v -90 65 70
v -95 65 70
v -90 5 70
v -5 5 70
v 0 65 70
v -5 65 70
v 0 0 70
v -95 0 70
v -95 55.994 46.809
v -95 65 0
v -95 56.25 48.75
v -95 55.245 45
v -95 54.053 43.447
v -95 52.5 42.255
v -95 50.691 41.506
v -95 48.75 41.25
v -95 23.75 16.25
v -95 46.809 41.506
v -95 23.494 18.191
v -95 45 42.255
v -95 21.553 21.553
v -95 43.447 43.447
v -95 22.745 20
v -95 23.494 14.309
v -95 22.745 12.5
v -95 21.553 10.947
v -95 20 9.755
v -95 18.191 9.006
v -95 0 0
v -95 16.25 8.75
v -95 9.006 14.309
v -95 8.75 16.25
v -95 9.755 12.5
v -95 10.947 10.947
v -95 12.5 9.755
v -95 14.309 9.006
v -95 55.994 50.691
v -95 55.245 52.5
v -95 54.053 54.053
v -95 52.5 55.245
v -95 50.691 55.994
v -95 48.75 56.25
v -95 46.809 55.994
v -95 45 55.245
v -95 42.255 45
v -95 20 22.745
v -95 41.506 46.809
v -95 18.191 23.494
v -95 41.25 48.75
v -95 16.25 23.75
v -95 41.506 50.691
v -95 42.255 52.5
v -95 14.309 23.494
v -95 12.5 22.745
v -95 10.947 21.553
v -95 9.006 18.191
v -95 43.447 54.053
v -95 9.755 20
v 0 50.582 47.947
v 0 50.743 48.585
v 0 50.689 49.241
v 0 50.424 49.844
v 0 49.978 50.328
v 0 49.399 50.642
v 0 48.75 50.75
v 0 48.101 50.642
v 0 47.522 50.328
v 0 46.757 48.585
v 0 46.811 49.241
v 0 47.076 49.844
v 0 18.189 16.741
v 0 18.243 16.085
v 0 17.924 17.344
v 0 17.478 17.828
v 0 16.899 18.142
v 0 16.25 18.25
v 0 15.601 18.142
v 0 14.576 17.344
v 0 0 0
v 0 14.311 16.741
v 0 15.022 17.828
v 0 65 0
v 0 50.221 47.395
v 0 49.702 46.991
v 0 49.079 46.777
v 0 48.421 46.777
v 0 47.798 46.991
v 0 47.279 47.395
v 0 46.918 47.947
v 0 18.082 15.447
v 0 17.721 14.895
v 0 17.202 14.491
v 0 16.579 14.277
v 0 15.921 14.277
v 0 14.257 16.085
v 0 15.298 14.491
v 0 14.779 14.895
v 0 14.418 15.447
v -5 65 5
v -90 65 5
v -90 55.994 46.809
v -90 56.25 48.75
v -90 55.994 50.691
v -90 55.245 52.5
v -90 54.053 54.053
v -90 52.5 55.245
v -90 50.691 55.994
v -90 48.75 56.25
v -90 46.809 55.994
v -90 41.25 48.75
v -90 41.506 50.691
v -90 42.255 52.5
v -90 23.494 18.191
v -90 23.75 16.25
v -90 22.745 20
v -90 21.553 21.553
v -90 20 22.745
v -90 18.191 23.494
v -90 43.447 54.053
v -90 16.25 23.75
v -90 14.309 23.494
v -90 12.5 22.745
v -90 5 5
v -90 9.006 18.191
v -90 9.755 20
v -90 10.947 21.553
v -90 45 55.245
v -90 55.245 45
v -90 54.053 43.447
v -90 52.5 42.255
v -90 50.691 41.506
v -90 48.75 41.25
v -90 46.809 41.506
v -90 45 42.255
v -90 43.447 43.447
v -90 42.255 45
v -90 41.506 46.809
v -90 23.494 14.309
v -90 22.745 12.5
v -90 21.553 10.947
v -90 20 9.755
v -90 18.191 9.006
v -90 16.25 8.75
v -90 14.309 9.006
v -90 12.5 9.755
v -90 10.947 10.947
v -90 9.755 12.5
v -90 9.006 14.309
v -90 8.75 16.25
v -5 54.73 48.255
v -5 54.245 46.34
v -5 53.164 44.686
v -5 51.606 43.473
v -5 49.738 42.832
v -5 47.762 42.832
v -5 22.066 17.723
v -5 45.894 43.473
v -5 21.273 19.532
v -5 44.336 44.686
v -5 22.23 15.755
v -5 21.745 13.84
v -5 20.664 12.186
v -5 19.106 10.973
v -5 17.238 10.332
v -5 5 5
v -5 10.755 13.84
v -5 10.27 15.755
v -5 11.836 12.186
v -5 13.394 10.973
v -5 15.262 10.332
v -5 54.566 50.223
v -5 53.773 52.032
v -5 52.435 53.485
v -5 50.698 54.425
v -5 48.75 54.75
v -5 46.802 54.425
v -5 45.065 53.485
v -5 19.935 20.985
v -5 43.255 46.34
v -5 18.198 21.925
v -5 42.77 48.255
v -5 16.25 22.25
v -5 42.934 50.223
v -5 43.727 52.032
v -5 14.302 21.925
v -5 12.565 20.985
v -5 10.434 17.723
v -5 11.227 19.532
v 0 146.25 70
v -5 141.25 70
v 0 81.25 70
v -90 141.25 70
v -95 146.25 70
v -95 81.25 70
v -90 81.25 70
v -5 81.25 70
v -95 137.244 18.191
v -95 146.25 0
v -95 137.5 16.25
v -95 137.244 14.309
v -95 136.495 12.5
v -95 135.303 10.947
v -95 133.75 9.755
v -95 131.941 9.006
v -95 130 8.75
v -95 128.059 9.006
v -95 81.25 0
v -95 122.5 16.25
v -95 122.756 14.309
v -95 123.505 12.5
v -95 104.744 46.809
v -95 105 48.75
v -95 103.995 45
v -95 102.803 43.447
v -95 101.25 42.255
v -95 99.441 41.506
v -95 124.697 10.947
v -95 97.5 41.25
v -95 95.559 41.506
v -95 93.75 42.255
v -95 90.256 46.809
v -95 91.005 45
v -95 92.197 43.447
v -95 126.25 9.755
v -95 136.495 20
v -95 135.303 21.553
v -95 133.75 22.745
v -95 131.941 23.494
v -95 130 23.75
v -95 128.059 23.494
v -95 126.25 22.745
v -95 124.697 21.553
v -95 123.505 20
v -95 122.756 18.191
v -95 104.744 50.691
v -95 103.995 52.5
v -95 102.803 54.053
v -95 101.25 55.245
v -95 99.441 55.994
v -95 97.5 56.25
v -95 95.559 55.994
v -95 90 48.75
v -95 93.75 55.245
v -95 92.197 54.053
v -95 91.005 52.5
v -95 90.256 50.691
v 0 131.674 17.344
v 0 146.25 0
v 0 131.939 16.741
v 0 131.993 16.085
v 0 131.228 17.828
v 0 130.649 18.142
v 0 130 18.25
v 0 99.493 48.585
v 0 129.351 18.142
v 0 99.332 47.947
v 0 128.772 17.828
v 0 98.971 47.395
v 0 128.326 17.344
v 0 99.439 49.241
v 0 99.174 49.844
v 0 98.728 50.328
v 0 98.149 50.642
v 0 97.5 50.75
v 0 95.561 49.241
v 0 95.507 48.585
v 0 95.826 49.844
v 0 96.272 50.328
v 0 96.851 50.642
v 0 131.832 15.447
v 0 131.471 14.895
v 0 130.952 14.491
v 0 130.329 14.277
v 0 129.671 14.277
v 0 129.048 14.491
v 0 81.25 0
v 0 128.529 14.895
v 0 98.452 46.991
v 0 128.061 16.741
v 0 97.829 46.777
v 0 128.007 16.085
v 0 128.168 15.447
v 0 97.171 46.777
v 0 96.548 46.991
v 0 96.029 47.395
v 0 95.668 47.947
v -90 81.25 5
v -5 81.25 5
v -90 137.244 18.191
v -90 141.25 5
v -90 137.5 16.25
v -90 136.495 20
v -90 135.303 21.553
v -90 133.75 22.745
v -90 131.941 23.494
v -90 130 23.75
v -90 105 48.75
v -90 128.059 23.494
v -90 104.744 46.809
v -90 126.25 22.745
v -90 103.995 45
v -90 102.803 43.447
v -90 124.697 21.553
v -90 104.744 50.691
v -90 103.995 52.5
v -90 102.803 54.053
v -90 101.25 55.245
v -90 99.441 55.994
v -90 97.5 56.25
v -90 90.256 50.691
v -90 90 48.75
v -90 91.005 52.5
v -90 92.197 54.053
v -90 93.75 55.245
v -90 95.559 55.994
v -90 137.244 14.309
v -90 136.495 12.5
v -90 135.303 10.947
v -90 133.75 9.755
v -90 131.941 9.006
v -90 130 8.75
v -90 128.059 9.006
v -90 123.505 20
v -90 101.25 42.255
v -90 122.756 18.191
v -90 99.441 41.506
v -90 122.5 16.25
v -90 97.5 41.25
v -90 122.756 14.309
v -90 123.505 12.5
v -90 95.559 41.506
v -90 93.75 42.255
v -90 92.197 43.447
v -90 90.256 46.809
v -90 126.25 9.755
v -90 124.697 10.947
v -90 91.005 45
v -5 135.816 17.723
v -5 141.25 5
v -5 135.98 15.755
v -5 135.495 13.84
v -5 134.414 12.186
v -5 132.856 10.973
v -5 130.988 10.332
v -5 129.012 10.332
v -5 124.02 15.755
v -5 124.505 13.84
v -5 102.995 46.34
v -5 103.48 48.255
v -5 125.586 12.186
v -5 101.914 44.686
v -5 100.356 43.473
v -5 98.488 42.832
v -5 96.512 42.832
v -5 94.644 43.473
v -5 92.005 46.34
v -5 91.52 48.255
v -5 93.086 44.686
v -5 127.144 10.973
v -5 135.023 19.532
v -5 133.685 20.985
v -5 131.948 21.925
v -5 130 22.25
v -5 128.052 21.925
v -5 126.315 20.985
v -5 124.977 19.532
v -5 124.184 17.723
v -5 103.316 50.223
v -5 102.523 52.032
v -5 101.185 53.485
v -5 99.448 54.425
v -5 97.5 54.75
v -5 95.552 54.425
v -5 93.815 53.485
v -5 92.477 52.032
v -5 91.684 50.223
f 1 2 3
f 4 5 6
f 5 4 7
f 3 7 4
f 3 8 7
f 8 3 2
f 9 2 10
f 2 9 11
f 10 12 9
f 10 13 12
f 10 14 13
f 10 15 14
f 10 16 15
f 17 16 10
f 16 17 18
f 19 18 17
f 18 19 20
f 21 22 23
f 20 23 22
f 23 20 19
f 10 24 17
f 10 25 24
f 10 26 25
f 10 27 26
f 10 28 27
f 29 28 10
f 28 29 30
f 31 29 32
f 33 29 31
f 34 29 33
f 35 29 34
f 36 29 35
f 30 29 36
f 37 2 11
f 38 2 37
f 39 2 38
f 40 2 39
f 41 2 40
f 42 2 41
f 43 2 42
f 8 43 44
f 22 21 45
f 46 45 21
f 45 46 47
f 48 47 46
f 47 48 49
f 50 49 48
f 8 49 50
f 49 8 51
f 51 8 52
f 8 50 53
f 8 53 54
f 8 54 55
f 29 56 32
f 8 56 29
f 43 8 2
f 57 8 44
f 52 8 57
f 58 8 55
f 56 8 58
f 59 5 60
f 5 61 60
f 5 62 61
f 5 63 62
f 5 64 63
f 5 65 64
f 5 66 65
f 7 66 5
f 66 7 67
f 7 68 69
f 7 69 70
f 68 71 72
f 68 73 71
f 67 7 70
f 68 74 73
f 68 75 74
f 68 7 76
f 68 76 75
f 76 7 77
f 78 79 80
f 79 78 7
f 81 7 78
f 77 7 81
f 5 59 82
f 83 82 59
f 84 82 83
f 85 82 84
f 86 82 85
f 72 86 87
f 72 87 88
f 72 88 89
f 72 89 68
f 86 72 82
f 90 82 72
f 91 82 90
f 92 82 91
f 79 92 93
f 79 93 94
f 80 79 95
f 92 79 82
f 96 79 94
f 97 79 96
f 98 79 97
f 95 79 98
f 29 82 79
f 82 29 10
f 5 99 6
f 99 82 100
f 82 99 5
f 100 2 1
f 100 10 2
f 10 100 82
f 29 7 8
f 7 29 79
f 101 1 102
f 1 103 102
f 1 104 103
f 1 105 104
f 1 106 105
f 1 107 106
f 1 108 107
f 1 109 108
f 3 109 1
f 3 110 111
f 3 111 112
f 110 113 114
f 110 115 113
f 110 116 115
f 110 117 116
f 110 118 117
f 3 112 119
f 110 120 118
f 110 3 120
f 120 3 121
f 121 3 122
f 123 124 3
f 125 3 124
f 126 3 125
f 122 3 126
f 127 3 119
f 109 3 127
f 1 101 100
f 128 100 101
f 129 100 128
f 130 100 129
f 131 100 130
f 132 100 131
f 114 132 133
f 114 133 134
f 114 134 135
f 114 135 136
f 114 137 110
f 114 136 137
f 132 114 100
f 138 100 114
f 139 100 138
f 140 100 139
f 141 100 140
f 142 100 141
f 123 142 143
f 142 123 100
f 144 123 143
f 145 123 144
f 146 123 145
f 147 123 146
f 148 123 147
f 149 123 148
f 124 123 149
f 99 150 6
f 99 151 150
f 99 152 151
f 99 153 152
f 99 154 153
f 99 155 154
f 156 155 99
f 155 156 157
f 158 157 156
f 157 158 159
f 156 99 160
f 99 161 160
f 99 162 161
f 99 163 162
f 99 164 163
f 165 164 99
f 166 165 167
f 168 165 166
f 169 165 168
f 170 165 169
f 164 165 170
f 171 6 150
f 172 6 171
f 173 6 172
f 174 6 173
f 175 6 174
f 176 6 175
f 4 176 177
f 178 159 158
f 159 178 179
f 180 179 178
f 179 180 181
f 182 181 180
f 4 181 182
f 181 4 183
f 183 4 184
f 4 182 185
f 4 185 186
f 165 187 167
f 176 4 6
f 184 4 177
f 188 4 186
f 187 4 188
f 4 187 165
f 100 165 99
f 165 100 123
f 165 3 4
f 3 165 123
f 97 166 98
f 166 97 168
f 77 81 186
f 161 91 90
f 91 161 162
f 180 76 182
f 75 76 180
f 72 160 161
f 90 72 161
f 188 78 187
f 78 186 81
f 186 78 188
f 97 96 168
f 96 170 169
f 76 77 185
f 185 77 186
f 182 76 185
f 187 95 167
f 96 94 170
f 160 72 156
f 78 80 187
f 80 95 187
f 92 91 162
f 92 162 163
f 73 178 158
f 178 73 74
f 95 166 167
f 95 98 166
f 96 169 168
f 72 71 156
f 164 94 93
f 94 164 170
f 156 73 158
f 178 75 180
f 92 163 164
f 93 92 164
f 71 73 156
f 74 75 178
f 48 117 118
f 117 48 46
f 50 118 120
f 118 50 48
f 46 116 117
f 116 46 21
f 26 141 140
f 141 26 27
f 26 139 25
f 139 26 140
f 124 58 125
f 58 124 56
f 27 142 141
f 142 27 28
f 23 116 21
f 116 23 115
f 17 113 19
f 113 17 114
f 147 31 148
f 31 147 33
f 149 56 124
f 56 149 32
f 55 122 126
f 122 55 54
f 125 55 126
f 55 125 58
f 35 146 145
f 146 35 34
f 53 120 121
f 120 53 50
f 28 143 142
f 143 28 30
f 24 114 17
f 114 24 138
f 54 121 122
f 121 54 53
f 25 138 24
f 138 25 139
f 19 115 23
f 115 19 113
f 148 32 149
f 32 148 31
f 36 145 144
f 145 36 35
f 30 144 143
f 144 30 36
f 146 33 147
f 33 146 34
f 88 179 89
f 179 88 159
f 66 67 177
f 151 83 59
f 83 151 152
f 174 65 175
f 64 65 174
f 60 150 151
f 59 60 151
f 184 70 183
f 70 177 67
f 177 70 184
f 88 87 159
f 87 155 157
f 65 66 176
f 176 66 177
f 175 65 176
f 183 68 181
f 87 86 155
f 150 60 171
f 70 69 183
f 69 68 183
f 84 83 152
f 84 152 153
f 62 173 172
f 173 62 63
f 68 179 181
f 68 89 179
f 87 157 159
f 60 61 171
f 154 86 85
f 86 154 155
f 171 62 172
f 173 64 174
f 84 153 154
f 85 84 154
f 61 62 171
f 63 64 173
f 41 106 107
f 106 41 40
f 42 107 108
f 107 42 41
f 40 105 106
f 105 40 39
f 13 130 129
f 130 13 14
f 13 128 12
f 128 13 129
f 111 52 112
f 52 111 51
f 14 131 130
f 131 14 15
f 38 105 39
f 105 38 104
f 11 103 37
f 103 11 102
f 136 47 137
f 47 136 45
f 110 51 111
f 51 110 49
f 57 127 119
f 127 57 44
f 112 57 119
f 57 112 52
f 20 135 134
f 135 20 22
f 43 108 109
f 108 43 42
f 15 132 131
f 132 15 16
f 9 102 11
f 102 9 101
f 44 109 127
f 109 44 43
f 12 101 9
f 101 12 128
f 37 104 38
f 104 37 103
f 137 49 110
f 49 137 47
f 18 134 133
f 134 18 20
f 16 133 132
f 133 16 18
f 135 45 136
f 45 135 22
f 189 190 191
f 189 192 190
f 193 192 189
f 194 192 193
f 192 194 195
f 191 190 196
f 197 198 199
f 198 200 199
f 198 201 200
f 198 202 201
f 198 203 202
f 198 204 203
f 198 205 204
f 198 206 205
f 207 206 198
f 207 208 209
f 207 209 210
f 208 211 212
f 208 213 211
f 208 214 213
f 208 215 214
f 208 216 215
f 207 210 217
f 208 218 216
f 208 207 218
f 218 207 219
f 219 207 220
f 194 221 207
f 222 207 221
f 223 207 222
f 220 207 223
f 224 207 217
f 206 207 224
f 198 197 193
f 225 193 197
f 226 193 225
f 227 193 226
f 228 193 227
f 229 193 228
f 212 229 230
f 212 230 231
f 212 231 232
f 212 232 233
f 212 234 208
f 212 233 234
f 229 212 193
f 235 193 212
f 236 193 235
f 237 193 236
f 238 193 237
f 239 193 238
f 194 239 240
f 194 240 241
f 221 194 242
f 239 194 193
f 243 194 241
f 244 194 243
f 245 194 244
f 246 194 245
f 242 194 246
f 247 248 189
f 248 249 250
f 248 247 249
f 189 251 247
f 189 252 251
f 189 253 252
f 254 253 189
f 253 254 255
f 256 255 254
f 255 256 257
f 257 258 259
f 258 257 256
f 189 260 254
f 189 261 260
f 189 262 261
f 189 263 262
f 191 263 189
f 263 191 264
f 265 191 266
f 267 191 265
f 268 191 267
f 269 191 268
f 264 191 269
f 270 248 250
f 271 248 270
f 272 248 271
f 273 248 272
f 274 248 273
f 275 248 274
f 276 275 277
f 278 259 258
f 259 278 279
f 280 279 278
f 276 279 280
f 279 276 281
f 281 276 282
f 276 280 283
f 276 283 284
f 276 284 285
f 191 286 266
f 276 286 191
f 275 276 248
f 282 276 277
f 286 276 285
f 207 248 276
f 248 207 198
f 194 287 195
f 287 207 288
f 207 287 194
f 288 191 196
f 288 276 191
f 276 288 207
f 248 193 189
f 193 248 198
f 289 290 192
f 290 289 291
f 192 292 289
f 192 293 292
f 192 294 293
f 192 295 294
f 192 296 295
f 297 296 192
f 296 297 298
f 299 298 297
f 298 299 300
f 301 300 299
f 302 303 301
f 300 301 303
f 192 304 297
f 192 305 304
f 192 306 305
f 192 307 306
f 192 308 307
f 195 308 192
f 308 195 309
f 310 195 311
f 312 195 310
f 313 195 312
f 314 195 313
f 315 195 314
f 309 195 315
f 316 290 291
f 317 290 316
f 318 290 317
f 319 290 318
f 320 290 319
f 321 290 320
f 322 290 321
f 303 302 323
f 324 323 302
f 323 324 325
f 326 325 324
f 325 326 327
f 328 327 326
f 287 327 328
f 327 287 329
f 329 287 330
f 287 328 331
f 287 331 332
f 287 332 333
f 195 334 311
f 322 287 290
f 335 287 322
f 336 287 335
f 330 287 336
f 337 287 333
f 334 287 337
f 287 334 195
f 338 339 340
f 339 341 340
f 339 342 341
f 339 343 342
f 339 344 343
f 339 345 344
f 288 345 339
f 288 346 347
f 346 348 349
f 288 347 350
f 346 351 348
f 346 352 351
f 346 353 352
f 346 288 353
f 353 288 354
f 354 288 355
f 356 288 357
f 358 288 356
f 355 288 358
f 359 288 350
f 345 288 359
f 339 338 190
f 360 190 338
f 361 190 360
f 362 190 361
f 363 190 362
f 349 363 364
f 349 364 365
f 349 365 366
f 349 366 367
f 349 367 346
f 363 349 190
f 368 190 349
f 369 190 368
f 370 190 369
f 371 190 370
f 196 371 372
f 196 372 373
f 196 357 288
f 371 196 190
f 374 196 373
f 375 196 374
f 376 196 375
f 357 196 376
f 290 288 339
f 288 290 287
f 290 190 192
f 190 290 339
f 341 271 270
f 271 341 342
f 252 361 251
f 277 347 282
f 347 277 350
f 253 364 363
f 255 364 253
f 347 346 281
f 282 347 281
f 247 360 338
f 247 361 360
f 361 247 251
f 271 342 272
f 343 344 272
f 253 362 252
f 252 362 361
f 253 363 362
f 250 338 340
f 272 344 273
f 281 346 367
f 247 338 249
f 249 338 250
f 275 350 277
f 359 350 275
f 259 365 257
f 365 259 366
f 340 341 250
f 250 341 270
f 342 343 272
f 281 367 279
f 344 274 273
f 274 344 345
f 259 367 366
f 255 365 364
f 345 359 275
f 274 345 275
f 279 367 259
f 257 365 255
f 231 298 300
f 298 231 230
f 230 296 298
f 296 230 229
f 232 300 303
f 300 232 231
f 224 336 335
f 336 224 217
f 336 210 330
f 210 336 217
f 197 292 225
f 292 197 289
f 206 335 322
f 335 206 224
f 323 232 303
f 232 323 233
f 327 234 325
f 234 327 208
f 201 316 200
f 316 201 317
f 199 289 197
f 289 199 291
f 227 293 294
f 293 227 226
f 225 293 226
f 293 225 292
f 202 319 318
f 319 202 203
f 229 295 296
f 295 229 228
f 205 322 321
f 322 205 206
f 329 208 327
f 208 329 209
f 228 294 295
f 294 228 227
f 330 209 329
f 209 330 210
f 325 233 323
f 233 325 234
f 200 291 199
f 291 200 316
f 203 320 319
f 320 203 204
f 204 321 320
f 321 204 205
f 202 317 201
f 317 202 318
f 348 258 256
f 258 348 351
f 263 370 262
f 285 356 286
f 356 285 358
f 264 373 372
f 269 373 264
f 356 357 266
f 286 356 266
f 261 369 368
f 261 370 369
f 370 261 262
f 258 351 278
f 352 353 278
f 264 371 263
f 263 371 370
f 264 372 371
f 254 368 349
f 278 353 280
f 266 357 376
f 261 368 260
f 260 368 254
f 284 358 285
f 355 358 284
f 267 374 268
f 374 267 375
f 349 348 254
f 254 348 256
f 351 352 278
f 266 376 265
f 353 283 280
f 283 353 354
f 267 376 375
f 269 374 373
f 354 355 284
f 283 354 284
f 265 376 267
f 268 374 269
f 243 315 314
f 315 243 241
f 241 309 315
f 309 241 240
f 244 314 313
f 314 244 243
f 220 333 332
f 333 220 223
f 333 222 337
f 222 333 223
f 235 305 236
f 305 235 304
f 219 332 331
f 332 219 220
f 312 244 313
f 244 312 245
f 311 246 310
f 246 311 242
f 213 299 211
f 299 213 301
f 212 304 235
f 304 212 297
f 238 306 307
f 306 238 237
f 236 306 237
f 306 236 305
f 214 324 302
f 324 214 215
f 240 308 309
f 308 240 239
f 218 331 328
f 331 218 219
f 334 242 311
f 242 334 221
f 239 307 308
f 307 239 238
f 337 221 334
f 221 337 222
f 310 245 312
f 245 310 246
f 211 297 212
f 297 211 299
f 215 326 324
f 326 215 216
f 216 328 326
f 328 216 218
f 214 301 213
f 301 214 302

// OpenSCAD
height=65;
width=65;
depth=85;   // Gereedschapkoffer

wallThickness=5;

screwDiameter=4;
screwHoleAccess = 15;

module screwHole () {
    translate([0,0,wallThickness/2])
        cylinder(h = wallThickness, d1 = screwDiameter, d2 = screwDiameter*3, center = true);
    translate([0,0,depth]){
        cylinder(h=(wallThickness*2), d=screwHoleAccess);
    };
}


module lock() {
    rotate([0,270,0]) {
        union() {
            difference() {
                cube([height+wallThickness,width,depth+2*wallThickness]);
                translate([wallThickness,wallThickness,wallThickness]) {
                    cube([height,width,depth]);
                }
            }
            translate([0,0,depth/2+wallThickness]) {
                difference() {
                    cylinder(h = depth+2*wallThickness, d = 4 + 2*wallThickness, center = true);
                    cylinder(h = depth+2*wallThickness, d = 4, center = true);
                }
            }
        }
    }
}

module RotatingCorner() {
    rotate([0,270,0]) {
        difference() {
            difference() {
                cube([height+wallThickness,width,depth+2*wallThickness]);
                translate([wallThickness,wallThickness,wallThickness]) {
                    cube([height,width,depth]);
                }
            }
//            union() {
//                translate([height/4,width/4,0]){
//                    screwHole();
//                }
                translate([height*3/4,width/4,0]){
                    screwHole();
                };
//            }
        }
    }
}
module corner() {
    rotate([0,270,0]) {
        difference() {
            difference() {
                cube([height+wallThickness,width,depth+2*wallThickness]);
                translate([wallThickness,wallThickness,wallThickness]) {
                    cube([height,width,depth]);
                }
            }
            union() {
                translate([height/4,width/4,0]){
                    screwHole();
                }
                translate([height*3/4,width*3/4,0]){
                    screwHole();
                };
            }
        }
    }
}

module locks () {
    lock();
    translate([0,width*2.25,0]) {
        mirror([0,1,0]) {
            lock();
        }
    }
}

module RotatingCorners () {
    RotatingCorner();
    translate([0,width*2.25,0]) {
        mirror([0,1,0]) {
            RotatingCorner();
        }
    }
}

module MountingCorners() {
    corner();
    translate([0,width*2.25,0]) {
        mirror([0,1,0]) {
            corner();
        }
    }
}

MountingCorners();
//translate([-depth - 3*wallThickness,0,0])
////    locks();
//    RotatingCorners();
